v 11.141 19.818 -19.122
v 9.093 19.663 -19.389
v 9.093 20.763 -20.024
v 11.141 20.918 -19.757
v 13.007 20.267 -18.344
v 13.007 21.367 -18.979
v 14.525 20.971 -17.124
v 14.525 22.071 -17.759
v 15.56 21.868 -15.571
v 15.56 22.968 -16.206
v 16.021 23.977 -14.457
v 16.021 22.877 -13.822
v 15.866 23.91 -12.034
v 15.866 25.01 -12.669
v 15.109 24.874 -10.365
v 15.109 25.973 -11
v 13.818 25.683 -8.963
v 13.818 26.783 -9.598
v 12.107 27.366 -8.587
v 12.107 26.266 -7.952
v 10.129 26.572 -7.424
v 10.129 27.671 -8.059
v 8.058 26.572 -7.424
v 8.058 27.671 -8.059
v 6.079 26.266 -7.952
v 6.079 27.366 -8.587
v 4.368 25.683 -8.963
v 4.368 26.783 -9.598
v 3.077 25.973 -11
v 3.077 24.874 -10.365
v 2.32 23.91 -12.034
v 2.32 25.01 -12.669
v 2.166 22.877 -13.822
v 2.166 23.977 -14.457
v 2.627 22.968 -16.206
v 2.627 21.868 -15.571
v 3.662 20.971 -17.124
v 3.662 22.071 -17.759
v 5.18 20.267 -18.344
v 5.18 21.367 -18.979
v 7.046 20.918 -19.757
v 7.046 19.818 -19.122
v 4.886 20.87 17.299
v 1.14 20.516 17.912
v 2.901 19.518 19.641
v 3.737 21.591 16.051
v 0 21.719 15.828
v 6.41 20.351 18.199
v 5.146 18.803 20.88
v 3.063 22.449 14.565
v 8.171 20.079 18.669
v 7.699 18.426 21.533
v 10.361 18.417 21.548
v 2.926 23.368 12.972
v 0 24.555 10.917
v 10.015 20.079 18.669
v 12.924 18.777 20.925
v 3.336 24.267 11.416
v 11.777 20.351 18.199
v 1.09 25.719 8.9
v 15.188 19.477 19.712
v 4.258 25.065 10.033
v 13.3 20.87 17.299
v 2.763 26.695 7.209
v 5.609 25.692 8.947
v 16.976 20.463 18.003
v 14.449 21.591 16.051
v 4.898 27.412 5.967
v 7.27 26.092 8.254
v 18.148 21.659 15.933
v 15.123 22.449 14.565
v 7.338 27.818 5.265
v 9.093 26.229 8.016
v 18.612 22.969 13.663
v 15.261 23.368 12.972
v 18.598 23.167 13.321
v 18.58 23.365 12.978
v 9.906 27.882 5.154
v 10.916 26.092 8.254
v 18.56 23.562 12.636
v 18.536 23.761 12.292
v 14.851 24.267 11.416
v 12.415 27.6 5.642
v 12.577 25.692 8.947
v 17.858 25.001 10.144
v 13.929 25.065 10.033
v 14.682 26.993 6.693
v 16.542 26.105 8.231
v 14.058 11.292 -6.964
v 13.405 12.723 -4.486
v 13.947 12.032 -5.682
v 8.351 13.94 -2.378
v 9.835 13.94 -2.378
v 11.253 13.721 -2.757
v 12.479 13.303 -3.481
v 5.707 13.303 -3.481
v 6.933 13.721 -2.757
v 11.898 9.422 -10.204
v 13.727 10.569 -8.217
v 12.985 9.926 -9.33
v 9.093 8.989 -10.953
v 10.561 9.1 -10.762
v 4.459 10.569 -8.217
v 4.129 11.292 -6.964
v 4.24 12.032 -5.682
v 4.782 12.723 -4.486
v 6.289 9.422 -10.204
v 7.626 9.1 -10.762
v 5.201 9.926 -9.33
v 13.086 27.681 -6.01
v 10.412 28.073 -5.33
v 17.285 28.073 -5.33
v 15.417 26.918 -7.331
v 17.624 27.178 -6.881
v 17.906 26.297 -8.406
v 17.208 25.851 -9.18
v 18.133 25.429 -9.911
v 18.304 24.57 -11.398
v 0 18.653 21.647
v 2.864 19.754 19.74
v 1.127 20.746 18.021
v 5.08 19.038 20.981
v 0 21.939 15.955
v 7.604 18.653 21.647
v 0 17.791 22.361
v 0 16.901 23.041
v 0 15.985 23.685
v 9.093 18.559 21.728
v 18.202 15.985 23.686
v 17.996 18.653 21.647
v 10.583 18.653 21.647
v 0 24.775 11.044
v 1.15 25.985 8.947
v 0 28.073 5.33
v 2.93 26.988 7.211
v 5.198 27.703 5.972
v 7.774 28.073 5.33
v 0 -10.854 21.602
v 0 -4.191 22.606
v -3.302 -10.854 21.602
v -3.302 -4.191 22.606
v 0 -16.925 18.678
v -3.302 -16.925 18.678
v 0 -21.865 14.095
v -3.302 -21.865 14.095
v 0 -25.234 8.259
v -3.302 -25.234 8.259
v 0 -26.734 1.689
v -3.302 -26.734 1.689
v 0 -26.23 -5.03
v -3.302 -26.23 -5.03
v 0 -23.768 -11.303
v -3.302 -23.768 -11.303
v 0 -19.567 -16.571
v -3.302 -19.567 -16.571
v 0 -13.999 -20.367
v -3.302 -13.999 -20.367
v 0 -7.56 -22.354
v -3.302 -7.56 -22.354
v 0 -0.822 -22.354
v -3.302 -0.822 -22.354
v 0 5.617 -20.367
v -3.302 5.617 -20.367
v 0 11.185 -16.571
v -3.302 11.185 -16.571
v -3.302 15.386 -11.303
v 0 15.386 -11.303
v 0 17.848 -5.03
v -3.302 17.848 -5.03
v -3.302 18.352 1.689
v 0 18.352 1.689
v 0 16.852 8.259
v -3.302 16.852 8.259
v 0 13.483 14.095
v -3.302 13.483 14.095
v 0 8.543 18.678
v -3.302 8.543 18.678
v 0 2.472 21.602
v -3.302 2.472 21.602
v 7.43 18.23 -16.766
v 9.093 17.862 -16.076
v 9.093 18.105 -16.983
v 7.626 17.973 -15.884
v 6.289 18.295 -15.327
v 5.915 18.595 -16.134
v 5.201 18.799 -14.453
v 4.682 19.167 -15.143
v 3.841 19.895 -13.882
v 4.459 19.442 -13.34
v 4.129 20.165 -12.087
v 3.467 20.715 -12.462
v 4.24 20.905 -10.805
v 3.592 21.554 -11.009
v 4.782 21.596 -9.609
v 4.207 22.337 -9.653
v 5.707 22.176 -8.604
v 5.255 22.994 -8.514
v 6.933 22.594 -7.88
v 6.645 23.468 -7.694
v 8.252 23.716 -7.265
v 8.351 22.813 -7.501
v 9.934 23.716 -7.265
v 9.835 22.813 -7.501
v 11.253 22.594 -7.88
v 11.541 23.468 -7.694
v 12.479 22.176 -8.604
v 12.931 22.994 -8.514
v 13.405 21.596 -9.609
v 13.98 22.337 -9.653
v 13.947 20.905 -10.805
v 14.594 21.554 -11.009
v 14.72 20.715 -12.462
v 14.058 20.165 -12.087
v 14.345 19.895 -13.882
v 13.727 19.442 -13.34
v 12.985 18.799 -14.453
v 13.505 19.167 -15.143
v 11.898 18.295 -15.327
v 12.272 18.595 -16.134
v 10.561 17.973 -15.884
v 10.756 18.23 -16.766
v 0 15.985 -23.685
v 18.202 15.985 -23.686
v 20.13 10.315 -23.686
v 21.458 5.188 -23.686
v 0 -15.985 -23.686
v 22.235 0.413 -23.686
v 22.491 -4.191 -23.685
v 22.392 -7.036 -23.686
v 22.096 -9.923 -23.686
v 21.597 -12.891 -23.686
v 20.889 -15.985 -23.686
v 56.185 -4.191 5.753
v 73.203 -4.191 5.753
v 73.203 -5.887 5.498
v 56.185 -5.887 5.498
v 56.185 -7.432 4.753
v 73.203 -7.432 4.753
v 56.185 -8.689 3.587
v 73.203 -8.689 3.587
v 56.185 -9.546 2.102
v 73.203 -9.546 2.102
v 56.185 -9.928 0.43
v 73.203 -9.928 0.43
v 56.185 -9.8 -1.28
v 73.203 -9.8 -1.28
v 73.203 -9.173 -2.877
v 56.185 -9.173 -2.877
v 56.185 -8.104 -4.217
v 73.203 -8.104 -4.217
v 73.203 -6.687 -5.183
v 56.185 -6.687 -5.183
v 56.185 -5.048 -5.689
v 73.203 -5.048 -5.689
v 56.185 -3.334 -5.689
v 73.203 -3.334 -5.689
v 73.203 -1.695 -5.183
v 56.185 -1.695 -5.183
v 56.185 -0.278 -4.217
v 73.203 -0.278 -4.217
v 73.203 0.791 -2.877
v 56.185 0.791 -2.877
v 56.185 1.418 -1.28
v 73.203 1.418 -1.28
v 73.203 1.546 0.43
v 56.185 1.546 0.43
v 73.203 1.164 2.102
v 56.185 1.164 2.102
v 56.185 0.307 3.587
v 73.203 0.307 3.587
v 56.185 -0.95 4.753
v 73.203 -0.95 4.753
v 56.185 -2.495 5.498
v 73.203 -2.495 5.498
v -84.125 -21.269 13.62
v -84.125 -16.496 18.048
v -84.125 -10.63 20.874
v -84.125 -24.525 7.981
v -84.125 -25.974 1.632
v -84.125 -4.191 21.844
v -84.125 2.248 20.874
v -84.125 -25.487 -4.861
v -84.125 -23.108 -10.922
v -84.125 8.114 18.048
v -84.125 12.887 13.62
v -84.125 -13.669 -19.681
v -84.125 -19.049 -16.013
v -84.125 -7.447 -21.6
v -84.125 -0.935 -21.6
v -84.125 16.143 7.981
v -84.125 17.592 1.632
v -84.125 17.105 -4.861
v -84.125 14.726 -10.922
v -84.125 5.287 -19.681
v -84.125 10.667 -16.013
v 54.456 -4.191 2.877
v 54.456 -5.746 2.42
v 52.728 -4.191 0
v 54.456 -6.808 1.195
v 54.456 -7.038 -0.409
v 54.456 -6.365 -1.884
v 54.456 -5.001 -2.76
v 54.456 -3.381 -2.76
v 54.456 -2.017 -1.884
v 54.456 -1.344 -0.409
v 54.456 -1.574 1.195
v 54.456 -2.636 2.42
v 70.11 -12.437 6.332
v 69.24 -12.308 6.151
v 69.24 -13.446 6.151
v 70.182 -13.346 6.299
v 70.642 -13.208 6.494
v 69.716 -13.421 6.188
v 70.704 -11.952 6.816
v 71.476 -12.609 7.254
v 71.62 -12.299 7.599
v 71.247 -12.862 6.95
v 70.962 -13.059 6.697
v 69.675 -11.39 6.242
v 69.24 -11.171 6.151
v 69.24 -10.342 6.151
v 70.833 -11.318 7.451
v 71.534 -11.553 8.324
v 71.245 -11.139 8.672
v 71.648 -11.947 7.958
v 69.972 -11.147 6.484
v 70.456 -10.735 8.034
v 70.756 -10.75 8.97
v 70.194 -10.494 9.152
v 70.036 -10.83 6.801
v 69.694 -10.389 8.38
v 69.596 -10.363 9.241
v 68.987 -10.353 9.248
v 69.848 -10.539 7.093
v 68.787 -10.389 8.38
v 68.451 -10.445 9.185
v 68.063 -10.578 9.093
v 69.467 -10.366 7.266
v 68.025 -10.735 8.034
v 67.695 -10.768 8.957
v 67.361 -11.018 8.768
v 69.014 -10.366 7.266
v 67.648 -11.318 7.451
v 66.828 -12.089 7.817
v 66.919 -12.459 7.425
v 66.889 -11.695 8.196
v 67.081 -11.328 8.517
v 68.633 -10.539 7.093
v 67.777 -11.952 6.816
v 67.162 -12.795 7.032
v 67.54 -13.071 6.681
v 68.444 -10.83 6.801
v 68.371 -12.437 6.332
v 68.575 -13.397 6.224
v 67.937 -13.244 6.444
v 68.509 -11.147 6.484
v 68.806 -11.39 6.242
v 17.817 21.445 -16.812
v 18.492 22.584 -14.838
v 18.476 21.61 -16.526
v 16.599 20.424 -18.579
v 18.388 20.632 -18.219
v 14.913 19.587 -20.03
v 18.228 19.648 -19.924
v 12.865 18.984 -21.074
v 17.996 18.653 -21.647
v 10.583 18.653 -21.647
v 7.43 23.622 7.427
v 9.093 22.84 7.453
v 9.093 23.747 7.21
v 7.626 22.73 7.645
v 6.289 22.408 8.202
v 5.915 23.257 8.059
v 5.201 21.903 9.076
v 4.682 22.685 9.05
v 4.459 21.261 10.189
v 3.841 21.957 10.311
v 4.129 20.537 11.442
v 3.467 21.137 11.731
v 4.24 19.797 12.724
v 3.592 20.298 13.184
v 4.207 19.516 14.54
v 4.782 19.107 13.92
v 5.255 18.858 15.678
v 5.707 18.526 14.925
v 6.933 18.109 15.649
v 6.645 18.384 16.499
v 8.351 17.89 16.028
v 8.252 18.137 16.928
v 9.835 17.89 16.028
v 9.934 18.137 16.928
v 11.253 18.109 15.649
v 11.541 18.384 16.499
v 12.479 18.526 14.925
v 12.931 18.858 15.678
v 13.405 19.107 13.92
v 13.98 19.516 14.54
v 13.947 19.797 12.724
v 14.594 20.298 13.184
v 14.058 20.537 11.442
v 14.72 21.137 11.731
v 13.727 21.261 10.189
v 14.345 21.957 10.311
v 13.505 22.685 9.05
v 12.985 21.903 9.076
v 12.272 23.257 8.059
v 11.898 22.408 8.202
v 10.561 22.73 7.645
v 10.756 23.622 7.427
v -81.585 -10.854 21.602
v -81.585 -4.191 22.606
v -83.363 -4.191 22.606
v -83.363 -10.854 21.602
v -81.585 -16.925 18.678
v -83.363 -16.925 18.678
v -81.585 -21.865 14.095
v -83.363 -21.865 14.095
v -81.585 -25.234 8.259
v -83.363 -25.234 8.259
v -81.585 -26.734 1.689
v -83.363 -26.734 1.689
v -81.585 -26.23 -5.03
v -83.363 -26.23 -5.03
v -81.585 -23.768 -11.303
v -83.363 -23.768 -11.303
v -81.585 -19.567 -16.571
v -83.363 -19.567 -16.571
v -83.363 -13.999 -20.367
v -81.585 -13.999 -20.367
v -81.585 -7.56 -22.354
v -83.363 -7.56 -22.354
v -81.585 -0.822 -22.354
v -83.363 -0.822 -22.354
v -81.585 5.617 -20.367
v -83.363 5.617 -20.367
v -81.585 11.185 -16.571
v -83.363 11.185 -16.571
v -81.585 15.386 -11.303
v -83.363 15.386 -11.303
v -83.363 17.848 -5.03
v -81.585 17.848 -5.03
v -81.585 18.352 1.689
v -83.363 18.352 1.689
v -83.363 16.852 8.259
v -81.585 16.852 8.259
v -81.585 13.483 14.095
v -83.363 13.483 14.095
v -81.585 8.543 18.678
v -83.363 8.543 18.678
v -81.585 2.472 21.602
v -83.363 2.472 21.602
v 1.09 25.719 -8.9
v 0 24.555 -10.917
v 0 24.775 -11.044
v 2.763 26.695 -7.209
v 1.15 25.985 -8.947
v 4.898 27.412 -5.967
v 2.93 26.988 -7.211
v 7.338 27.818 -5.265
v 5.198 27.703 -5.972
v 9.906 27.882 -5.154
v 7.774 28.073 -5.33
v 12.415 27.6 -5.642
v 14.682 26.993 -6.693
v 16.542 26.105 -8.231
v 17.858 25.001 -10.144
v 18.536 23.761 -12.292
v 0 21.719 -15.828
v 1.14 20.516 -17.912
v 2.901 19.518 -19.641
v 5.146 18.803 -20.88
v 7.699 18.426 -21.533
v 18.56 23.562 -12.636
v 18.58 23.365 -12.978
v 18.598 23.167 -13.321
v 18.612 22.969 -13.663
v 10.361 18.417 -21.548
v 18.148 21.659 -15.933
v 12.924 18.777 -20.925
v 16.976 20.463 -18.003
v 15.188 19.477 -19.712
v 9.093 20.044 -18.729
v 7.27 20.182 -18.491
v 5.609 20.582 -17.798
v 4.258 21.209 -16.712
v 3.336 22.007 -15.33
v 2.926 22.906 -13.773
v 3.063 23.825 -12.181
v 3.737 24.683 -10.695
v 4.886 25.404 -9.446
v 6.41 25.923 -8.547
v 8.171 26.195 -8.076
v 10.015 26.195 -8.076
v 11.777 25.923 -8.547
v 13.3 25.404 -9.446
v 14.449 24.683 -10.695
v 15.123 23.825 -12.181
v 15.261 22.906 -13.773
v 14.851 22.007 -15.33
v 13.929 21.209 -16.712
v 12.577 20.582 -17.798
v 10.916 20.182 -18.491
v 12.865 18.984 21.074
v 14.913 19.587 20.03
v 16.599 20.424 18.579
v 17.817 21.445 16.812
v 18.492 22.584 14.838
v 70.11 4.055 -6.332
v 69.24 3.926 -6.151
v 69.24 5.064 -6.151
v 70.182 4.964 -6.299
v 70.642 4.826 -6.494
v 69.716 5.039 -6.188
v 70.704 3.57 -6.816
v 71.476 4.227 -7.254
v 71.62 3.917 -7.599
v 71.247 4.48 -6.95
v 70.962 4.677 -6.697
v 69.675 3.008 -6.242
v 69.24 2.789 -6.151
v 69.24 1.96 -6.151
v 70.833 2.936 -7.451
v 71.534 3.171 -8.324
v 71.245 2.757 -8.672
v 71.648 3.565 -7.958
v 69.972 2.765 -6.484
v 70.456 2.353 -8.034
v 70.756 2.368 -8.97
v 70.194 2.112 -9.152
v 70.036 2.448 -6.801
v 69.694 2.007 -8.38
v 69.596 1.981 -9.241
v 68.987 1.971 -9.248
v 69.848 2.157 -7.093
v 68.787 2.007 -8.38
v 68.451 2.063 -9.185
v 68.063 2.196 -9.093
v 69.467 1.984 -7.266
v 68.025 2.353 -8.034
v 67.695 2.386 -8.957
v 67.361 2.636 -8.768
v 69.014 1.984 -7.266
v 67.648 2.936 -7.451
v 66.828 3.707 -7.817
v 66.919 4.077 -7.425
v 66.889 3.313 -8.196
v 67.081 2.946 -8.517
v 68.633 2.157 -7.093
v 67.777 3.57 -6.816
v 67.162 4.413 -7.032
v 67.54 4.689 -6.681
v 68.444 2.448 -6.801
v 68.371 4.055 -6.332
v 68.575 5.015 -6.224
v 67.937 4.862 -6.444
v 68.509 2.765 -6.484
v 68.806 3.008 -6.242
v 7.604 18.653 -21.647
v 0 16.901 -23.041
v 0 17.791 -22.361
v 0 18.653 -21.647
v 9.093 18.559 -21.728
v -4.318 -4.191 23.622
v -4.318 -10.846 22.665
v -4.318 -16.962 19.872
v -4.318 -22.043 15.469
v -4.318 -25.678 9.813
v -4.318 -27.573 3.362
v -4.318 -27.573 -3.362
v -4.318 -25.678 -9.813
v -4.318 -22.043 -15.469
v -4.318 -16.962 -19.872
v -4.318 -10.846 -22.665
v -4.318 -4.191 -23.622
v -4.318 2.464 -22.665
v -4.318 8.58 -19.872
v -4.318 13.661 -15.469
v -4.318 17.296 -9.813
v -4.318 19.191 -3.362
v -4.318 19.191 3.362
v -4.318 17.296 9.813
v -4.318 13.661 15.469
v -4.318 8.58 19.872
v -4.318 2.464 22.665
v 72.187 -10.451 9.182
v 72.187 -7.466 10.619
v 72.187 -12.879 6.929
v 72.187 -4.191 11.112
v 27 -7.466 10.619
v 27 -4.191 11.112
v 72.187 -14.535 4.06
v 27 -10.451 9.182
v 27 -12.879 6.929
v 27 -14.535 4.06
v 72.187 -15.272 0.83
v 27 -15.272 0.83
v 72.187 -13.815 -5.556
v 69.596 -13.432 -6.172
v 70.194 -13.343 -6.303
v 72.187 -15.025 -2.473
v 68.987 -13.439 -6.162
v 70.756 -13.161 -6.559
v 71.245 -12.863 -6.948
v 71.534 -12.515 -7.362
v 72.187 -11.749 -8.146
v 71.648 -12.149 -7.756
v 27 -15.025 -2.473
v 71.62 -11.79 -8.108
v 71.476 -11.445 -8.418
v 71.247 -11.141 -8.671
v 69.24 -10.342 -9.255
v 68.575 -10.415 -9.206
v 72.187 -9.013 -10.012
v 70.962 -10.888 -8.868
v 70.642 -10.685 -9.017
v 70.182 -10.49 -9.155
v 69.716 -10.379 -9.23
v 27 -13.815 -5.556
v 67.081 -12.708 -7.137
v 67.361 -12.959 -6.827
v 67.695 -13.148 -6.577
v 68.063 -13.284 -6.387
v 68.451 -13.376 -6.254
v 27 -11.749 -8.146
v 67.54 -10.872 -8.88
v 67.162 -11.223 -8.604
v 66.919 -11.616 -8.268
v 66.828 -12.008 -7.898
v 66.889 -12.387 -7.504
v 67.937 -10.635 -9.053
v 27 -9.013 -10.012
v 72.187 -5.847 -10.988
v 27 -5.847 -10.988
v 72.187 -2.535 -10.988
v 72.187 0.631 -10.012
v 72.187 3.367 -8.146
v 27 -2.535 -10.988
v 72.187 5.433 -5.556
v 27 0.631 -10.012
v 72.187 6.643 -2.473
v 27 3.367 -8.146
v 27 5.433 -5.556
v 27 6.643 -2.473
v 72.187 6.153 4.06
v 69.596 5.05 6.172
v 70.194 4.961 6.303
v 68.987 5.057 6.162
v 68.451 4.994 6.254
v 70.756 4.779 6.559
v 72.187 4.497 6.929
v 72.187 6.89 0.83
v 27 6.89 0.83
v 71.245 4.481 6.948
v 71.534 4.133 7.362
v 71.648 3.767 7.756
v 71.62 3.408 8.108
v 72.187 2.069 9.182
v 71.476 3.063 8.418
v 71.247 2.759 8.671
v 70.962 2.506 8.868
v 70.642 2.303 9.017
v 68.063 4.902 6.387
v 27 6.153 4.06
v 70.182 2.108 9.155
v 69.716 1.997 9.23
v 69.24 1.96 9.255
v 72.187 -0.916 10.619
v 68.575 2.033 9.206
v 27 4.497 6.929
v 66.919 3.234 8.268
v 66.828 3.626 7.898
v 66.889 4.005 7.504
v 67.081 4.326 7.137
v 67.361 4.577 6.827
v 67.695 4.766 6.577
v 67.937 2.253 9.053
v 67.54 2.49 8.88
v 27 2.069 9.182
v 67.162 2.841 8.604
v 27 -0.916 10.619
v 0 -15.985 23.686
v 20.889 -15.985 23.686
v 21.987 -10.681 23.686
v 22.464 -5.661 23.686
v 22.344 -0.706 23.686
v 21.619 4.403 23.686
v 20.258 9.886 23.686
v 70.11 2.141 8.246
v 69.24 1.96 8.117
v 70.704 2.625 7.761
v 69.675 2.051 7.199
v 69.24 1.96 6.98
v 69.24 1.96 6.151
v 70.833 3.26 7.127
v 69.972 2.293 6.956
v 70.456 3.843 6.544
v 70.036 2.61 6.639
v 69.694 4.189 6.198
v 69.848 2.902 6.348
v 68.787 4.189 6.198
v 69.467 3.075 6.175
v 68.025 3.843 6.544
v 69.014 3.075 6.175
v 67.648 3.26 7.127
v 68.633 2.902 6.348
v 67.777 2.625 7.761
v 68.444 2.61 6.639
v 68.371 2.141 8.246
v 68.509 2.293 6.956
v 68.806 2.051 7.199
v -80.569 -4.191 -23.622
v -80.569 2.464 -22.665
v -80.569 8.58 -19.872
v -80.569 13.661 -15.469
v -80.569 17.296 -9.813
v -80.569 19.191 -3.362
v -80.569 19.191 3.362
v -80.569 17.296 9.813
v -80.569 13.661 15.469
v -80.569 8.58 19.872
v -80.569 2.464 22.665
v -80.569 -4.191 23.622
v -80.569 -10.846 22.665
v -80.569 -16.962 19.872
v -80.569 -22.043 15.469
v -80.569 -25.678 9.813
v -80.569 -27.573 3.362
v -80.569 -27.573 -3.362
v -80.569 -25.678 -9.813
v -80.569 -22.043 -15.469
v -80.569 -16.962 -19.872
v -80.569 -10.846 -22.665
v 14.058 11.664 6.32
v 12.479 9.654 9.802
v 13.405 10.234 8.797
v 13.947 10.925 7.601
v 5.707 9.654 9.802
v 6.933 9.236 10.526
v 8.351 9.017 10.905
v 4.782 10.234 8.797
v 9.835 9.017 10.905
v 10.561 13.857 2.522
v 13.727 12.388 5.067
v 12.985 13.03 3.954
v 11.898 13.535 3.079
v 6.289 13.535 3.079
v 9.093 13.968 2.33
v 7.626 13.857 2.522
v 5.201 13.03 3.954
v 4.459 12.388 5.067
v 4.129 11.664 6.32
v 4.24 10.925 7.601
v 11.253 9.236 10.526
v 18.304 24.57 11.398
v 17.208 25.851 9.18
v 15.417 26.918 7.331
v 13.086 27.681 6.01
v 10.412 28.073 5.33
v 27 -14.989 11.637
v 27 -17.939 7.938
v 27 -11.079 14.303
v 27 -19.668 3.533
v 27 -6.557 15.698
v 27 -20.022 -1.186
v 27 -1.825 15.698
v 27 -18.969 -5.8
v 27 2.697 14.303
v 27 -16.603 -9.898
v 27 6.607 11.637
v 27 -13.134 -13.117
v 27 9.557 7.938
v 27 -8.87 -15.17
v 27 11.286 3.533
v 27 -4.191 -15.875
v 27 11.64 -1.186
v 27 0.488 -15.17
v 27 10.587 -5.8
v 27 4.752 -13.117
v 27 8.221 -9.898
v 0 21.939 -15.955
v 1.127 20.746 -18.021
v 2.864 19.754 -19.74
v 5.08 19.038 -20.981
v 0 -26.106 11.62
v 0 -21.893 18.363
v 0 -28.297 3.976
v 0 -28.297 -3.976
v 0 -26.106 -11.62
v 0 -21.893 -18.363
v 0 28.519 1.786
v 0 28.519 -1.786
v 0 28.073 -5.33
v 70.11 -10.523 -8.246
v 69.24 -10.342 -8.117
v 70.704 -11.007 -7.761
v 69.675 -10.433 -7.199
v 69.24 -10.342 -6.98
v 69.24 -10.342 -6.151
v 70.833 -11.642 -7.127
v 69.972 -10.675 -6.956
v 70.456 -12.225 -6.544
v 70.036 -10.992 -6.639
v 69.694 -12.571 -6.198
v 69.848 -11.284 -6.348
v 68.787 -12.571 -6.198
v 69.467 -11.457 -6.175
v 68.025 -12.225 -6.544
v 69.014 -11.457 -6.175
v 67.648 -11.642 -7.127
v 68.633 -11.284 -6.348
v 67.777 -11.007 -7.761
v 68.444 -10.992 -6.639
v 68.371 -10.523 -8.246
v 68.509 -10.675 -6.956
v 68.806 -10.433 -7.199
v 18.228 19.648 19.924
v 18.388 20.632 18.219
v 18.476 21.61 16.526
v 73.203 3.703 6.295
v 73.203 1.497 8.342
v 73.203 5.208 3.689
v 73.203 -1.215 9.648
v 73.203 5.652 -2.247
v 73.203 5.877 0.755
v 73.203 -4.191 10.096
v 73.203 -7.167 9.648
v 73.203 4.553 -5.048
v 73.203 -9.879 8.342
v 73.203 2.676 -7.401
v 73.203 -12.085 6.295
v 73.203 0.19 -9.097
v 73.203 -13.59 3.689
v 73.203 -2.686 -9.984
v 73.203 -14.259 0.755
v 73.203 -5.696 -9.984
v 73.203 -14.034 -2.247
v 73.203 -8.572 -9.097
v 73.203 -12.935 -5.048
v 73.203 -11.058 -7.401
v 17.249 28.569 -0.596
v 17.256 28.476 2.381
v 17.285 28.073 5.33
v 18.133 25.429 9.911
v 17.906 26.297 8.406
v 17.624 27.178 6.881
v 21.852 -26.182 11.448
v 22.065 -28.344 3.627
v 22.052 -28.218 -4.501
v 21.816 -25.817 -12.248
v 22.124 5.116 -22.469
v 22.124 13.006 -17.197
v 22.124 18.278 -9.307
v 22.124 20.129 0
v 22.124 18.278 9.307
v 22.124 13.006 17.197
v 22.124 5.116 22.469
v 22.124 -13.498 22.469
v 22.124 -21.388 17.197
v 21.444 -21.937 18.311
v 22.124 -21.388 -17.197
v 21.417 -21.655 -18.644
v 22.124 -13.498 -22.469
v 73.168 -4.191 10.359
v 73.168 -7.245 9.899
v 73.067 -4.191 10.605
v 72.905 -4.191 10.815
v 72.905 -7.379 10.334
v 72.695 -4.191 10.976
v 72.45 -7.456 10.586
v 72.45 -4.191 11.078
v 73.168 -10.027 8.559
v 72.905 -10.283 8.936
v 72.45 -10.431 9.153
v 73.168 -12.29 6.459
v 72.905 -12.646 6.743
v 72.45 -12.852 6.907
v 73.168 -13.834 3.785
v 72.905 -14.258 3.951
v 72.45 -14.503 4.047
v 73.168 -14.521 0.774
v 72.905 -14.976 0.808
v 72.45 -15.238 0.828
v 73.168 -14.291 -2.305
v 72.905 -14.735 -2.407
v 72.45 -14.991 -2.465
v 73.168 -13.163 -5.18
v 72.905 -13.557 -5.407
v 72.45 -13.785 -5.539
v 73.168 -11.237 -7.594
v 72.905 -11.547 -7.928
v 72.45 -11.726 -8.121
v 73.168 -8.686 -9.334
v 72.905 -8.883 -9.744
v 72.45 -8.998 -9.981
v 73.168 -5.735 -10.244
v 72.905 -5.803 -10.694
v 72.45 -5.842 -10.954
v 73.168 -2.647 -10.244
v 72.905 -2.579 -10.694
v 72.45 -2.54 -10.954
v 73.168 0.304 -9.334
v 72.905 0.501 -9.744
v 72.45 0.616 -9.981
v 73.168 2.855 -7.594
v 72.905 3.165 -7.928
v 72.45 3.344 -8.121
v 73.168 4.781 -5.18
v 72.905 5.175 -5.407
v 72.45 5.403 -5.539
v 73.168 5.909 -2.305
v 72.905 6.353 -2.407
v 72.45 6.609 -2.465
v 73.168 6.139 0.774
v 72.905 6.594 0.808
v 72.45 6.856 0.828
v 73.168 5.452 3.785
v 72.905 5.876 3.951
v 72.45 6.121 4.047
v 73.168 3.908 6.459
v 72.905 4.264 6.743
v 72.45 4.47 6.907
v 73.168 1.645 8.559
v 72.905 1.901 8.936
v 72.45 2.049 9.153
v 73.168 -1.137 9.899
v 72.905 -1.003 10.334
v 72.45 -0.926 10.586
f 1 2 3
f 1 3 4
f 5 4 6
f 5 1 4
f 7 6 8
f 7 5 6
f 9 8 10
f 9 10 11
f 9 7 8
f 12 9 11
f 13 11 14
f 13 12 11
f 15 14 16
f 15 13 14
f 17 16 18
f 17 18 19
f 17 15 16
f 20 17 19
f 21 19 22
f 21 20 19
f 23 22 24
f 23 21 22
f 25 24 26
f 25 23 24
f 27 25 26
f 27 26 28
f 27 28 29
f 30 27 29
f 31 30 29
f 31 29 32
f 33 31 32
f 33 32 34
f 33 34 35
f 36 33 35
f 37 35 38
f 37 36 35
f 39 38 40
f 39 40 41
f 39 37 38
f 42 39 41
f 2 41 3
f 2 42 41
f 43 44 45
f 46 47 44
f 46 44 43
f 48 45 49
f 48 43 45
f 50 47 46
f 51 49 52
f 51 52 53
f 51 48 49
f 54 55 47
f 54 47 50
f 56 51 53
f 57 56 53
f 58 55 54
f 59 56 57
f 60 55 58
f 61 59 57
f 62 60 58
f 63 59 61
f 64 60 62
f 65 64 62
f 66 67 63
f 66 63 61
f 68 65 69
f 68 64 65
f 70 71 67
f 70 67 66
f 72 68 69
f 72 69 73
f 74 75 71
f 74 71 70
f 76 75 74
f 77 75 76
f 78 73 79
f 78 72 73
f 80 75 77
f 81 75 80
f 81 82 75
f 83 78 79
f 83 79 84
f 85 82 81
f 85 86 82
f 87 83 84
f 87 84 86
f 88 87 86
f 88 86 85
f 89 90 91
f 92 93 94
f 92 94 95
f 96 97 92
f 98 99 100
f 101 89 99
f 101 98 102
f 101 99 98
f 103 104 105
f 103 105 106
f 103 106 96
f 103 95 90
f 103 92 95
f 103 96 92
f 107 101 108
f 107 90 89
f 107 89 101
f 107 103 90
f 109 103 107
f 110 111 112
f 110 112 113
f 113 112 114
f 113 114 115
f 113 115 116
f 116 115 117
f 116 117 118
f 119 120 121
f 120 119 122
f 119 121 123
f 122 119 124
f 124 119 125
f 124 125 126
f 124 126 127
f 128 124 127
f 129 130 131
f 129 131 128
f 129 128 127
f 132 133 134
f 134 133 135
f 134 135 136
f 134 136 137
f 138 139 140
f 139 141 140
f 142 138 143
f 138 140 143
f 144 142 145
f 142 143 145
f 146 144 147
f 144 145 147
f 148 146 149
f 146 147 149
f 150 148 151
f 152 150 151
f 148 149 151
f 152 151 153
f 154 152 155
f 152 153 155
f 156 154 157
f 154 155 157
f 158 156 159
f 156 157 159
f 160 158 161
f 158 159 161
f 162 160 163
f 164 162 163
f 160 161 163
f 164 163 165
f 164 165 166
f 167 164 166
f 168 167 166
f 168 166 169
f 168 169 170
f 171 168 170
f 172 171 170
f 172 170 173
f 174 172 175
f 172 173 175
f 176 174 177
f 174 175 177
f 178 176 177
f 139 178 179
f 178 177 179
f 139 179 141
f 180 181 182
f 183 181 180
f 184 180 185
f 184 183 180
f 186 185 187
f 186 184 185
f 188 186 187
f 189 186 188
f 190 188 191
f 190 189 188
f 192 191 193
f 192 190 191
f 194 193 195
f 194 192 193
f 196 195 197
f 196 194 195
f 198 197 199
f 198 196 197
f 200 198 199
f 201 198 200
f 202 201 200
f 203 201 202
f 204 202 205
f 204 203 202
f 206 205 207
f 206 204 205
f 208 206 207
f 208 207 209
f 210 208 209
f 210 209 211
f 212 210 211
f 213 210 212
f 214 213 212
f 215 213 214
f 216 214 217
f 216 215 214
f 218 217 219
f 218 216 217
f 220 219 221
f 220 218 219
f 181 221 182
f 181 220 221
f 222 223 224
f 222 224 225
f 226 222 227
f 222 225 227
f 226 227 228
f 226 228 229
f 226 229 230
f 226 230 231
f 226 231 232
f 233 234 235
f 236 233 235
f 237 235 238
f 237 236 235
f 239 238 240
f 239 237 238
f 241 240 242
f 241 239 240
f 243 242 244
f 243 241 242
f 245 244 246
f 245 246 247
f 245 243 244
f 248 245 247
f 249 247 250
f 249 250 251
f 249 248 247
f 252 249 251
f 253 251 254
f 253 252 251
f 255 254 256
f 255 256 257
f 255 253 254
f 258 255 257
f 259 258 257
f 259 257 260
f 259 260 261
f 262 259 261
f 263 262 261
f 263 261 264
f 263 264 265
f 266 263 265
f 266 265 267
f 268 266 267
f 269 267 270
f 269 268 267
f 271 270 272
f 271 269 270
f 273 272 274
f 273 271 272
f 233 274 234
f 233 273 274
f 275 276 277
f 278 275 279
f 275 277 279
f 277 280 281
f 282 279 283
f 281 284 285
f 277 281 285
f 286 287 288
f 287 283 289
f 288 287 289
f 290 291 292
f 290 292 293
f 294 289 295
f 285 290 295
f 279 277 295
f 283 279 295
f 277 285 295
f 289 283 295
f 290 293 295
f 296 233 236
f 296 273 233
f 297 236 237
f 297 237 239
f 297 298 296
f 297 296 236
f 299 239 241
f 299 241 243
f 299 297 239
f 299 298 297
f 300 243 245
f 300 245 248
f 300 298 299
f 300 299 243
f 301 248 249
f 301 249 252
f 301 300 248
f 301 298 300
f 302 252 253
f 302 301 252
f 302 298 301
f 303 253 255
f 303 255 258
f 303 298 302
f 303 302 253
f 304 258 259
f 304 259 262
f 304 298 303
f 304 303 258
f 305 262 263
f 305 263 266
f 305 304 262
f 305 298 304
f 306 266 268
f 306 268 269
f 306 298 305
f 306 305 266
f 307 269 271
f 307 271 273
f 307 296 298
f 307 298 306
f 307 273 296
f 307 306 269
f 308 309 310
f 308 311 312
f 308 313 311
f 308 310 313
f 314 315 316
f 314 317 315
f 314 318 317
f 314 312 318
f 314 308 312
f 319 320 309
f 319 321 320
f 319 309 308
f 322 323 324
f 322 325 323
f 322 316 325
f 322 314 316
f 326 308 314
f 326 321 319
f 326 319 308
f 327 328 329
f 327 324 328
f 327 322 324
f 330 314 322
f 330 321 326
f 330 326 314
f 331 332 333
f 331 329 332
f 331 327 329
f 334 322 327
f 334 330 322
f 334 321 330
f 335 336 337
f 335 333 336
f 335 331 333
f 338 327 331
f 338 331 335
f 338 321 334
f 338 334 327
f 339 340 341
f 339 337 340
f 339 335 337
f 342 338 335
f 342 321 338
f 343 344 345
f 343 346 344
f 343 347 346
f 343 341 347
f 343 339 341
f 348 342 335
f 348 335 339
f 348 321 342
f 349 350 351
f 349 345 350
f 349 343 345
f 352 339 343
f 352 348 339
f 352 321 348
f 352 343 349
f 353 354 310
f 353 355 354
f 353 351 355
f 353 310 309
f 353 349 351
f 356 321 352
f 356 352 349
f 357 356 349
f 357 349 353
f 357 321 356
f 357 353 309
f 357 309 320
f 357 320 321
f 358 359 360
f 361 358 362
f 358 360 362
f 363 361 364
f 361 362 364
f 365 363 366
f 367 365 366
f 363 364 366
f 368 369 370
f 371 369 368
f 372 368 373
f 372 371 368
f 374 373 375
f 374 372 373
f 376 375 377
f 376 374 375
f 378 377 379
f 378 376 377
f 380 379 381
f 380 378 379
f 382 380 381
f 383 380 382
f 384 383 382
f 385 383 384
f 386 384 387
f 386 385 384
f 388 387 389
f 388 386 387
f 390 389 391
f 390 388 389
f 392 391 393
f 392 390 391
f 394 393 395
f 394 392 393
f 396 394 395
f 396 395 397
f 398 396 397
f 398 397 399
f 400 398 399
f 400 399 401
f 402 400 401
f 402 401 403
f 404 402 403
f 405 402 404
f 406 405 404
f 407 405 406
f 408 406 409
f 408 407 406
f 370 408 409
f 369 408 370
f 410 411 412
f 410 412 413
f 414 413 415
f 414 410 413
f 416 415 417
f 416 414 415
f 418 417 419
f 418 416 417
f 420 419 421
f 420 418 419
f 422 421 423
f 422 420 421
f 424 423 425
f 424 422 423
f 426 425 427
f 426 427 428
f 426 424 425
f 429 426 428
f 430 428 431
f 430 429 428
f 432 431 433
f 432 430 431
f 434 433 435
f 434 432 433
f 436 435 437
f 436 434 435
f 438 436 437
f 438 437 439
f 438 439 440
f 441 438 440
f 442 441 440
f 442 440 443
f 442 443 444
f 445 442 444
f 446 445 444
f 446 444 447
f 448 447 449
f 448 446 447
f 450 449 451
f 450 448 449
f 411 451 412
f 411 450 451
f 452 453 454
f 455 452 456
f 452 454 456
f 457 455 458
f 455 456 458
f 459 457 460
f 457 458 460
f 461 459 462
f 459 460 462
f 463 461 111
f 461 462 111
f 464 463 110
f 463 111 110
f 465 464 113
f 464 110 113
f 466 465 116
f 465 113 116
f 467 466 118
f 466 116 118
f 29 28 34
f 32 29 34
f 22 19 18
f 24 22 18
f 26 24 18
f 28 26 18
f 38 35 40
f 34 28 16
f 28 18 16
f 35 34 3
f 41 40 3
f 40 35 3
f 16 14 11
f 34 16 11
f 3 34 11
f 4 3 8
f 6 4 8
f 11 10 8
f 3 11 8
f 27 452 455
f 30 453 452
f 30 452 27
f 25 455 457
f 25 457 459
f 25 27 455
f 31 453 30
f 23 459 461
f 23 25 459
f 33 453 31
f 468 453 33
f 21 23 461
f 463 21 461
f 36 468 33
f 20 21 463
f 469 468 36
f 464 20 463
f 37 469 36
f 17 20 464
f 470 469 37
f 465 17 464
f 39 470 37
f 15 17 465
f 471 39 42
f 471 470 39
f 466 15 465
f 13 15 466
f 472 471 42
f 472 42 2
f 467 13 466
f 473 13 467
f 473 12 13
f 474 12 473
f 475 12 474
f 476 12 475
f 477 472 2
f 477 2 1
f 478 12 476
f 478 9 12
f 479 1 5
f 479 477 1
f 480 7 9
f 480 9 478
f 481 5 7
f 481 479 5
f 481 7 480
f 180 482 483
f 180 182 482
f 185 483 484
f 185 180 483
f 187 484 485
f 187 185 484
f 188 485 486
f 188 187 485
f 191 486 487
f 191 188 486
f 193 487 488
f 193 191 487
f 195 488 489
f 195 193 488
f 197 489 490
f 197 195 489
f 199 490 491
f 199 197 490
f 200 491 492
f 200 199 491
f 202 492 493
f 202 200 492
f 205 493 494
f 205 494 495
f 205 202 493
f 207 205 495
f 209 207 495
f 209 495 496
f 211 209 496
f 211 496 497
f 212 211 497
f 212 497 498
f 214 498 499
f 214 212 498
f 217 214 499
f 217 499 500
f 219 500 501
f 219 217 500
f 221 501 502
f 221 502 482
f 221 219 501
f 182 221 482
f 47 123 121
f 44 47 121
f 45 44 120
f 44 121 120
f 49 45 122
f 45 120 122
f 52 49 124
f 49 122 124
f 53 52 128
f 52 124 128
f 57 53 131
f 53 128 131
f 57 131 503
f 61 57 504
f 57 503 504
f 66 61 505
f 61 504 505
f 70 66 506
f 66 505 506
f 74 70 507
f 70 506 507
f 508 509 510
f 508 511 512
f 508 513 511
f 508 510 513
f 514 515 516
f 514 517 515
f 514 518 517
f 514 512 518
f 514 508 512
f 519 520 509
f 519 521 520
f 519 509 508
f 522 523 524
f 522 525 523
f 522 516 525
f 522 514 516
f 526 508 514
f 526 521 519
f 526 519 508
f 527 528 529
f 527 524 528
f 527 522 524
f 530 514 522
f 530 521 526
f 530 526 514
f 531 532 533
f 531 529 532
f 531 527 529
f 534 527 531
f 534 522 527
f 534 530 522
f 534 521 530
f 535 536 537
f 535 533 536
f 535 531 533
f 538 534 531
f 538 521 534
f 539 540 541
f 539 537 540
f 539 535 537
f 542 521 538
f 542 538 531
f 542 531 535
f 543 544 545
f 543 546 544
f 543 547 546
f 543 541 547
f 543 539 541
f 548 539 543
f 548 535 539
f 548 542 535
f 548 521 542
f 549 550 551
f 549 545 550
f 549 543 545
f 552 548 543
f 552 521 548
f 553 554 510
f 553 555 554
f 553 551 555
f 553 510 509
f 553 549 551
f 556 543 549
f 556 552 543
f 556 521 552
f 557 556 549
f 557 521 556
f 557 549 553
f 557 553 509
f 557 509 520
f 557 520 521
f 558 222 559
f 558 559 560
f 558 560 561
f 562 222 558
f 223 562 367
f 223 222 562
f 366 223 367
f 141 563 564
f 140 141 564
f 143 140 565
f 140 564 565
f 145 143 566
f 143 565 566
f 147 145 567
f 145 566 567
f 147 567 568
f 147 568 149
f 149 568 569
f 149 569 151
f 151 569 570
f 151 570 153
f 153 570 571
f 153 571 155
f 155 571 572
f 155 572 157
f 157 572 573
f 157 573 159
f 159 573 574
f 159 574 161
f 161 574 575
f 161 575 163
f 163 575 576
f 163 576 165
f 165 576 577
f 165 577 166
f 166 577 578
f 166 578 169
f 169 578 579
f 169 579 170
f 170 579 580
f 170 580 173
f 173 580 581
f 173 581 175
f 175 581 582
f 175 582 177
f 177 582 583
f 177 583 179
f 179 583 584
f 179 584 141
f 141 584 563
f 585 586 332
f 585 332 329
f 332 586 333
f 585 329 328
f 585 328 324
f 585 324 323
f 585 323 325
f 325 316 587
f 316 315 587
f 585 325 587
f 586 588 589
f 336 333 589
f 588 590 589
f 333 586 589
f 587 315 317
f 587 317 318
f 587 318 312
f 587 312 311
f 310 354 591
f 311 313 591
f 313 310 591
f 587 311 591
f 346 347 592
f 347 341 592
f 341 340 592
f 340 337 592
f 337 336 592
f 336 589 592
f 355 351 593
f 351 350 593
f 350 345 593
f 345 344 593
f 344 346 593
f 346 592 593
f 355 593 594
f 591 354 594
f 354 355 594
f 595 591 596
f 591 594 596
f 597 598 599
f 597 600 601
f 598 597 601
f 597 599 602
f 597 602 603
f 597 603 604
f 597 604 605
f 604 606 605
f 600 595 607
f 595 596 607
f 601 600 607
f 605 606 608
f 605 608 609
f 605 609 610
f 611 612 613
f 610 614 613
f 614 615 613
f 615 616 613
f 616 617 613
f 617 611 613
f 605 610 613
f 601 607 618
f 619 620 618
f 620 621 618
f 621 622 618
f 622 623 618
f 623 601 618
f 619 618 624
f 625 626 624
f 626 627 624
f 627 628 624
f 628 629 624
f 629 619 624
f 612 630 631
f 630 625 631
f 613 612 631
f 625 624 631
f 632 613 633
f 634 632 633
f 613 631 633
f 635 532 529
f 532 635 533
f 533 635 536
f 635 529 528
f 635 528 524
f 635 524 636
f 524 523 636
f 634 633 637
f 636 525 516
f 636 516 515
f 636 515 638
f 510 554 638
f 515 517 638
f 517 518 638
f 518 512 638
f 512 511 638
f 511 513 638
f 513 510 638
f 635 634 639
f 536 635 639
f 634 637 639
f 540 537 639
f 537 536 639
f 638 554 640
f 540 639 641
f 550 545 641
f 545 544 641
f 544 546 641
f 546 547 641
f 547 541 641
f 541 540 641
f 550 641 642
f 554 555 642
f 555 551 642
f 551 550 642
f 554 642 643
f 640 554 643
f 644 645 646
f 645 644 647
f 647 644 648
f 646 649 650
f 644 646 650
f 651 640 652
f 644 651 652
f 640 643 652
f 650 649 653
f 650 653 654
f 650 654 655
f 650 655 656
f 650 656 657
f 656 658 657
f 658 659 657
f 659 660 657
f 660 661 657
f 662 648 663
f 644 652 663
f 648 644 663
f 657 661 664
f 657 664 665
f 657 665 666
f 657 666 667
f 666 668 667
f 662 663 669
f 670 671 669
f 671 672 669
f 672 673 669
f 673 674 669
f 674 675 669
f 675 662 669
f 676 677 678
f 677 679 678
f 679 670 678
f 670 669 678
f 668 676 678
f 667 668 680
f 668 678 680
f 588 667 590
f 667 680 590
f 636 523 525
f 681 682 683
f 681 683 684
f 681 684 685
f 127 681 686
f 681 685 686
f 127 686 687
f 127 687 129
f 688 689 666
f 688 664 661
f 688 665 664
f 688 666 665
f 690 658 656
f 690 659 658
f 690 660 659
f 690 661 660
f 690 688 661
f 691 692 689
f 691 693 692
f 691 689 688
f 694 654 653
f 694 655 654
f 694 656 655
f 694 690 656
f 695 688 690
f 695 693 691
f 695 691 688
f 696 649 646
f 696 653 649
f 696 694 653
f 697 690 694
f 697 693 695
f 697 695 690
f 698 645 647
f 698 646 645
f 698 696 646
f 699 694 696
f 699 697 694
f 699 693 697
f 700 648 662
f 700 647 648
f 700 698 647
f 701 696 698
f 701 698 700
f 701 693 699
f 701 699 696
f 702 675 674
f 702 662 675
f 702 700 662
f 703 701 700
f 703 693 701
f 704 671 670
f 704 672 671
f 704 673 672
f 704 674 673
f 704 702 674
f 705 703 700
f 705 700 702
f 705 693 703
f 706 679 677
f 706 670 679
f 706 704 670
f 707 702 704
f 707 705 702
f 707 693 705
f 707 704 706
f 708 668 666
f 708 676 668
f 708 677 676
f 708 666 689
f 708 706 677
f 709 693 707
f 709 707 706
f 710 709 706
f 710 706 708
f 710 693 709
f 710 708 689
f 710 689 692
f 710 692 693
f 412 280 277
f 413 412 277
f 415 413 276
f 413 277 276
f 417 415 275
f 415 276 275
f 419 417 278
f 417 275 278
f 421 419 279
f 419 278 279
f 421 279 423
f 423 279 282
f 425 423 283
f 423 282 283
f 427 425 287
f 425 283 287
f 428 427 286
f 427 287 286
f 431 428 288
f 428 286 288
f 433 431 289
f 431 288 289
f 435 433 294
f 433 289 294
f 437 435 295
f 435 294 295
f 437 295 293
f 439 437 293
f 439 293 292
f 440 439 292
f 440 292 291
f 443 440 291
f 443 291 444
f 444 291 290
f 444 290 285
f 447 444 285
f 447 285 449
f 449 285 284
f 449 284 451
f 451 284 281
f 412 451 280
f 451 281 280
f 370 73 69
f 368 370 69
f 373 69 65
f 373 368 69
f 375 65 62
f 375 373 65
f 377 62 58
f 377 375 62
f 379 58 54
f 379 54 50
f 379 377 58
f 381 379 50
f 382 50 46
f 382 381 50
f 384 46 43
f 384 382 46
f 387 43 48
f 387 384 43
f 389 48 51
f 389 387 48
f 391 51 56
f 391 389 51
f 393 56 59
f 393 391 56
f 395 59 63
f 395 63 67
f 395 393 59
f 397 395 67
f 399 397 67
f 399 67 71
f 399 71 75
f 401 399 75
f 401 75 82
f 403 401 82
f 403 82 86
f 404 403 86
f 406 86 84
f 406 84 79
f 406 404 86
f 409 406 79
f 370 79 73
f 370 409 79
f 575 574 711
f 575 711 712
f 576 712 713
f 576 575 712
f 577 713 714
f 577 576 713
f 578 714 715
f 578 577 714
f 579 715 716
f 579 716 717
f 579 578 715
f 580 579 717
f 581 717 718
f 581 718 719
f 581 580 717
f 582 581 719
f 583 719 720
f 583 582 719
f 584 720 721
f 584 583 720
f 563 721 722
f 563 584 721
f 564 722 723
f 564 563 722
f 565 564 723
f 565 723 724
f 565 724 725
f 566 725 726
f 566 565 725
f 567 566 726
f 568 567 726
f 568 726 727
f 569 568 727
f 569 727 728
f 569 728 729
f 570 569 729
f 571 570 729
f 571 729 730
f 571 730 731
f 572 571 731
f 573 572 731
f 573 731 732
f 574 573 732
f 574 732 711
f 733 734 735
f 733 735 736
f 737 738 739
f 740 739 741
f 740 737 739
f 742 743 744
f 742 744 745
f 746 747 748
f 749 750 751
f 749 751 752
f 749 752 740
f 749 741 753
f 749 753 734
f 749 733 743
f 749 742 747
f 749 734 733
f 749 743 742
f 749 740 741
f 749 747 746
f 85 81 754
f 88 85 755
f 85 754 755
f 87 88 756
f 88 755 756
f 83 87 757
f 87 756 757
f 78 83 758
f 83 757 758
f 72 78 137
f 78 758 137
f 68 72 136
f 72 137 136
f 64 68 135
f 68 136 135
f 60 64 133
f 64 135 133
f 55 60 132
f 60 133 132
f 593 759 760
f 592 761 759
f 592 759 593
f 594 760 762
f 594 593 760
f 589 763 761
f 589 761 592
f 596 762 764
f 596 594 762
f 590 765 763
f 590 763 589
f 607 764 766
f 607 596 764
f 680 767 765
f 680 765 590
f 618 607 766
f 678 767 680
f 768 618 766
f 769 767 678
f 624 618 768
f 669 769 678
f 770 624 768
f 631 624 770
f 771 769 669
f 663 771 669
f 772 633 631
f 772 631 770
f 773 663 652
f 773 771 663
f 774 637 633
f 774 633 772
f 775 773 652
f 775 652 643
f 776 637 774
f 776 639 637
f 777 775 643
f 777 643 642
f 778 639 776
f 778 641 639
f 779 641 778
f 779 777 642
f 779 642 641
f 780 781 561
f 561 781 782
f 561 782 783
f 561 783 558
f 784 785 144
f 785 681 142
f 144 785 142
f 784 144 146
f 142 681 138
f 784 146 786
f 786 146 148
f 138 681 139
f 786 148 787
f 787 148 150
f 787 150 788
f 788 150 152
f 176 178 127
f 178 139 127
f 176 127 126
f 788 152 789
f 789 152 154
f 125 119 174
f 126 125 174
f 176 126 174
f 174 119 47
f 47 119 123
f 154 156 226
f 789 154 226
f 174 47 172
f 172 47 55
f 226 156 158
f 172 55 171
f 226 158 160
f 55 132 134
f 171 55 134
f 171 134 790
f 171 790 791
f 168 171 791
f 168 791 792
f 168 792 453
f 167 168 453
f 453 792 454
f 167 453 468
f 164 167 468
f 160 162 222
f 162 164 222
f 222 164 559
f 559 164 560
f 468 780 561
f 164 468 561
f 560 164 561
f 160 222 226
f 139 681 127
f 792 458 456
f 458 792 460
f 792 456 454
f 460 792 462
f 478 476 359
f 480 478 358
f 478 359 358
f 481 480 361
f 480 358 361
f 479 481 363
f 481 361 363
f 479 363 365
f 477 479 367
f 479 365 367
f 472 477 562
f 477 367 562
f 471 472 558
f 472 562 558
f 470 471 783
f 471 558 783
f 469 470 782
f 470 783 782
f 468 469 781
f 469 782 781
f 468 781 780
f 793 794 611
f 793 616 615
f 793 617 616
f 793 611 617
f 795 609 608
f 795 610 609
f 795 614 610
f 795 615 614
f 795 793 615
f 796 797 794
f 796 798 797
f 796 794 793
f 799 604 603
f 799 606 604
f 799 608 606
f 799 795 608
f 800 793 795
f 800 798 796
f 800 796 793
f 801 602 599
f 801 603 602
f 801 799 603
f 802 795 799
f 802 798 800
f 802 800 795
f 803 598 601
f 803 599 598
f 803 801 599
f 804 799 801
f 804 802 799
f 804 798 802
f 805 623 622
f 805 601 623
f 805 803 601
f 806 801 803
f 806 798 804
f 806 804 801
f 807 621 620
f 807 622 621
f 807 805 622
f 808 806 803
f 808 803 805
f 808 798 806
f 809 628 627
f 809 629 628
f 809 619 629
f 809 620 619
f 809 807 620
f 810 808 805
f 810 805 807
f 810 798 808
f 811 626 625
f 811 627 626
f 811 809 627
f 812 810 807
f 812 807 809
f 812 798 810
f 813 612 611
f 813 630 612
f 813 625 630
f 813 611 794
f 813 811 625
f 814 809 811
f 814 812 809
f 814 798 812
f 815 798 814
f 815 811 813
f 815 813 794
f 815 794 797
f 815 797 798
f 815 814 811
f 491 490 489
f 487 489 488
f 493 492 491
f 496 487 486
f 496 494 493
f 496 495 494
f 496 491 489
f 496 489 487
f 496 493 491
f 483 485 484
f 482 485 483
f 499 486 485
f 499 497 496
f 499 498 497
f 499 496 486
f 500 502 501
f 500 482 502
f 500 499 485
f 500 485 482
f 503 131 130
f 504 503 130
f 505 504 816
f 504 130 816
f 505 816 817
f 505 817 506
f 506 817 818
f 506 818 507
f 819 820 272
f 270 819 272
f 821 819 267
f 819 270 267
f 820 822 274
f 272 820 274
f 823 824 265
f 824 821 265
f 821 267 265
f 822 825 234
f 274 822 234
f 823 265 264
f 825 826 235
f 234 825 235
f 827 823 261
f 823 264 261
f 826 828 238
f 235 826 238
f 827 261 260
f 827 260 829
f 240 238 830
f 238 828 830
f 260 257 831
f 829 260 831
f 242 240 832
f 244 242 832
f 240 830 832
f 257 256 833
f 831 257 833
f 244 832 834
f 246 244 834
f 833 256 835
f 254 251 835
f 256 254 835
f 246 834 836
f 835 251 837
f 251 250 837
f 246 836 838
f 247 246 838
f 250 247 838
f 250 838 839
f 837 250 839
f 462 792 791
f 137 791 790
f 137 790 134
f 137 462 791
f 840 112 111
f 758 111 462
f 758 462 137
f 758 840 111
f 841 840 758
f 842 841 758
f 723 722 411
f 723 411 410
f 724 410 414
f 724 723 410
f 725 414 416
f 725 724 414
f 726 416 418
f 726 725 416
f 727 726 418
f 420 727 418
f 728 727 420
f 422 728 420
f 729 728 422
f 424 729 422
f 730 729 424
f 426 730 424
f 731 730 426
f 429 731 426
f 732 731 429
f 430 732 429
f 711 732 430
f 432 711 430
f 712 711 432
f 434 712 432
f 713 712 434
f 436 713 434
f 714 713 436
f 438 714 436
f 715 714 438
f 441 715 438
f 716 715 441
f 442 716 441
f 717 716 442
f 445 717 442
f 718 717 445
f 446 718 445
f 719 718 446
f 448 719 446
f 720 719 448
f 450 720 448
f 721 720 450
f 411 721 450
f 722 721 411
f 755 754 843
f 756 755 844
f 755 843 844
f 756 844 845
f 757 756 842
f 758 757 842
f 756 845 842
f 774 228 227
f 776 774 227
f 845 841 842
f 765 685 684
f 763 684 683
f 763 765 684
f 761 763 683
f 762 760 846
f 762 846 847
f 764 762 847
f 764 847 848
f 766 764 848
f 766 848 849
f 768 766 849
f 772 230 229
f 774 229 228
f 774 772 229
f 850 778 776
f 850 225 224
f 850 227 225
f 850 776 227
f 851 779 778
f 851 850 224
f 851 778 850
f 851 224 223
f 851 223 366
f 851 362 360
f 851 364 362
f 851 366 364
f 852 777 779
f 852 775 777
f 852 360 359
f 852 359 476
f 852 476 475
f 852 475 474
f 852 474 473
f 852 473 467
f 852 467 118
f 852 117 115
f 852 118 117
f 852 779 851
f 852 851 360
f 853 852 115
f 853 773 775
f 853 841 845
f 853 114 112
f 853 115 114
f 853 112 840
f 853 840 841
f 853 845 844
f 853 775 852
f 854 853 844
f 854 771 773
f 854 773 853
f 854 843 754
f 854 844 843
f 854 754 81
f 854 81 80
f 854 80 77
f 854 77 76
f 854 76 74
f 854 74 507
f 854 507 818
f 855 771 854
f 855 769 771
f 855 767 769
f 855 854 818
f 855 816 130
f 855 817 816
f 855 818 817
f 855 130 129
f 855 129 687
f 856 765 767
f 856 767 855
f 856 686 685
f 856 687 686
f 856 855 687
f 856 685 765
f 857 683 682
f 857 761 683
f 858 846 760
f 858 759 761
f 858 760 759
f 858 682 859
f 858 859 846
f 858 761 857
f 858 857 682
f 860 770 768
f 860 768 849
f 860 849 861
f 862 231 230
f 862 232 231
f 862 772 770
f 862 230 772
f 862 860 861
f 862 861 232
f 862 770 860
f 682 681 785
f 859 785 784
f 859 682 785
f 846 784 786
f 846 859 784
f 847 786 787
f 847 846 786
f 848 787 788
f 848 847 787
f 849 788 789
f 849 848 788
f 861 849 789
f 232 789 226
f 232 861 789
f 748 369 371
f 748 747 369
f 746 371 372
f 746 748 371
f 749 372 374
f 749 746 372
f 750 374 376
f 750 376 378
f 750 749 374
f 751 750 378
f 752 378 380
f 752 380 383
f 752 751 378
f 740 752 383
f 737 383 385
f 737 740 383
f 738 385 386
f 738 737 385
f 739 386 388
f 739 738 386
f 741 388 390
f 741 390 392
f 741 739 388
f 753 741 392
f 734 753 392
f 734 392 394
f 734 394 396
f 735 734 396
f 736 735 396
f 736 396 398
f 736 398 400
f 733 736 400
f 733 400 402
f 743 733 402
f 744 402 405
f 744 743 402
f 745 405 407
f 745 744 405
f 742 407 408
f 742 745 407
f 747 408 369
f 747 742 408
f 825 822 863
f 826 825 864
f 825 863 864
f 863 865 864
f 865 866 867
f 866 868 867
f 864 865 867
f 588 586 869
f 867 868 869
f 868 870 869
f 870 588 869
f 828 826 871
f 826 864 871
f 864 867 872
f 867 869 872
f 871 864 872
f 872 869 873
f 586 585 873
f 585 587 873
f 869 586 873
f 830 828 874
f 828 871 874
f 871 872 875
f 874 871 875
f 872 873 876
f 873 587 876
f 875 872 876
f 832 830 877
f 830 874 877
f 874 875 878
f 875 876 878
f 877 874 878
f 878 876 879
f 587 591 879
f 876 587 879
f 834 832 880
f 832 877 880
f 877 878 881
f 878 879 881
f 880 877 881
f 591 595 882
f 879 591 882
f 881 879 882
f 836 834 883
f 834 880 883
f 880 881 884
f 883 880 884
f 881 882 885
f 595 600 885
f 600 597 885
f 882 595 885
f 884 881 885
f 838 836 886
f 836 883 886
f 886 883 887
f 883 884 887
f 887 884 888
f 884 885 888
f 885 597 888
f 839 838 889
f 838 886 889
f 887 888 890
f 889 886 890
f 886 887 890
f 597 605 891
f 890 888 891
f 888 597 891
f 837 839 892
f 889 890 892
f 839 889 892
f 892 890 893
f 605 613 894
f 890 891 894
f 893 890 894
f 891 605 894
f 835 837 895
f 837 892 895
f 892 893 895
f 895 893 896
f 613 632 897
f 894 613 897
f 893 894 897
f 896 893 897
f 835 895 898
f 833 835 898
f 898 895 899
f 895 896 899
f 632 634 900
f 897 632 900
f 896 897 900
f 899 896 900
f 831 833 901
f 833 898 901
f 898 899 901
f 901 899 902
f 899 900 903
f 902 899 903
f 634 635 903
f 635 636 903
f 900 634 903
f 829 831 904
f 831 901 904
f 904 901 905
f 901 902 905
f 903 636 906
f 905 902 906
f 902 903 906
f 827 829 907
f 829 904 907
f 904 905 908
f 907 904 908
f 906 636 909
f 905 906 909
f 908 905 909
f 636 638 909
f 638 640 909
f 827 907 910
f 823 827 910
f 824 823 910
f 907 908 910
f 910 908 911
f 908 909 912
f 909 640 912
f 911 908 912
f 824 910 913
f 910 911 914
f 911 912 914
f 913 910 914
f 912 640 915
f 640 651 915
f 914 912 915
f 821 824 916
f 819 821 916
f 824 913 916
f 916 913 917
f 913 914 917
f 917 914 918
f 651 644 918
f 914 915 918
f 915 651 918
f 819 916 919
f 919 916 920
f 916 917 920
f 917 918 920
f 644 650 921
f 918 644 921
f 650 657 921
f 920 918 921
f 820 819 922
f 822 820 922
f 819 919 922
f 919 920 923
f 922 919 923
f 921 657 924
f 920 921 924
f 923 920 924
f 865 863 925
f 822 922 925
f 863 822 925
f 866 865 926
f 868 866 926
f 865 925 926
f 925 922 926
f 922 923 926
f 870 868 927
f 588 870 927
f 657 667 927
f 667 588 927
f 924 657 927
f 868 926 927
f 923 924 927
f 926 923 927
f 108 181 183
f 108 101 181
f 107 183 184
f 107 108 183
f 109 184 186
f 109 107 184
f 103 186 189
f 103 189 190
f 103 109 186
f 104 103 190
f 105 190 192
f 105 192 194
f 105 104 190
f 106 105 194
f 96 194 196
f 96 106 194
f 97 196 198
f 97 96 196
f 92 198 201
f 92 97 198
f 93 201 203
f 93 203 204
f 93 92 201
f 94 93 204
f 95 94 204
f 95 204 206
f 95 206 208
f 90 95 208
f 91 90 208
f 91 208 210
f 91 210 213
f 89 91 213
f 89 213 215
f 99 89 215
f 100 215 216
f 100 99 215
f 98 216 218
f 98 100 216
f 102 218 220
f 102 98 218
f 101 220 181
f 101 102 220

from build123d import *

# Parameters (mm, degrees)
SKETCH1_R           = 28.575
EXTRUDE1_DEPTH      = 27.0002
EXTRUDE1_DEPTH_BACK = 84.1248
CUT_EXTRUDE1_REACH  = 86.125
SKETCH2_R           = 28.575
SKETCH2_R_2         = 23.622
CUT_EXTRUDE3_START  = -27.0002
CUT_EXTRUDE3_DEPTH  = 27.0002
SKETCH18_R          = 9.525
CUT_EXTRUDE4_DEPTH  = 0.254
SKETCH19_R          = 9.525
CUT_EXTRUDE5_DEPTH  = 0.254
CHAMFER1_SIZE       = 0.762
SKETCH15_R          = 6.9469
EXTRUDE2_DEPTH      = 1.27
CIRPATTERN1_COUNT   = 4


with BuildPart() as part:
    # Sketch1 → Extrude1 (new body, two sides)
    with BuildSketch(Plane(origin=(0, 0, 0), x_dir=(0, 0, -1), z_dir=(1, 0, 0))) as extrude1_sk:
        Circle(SKETCH1_R)
    extrude(amount=EXTRUDE1_DEPTH)
    extrude(extrude1_sk.sketch, amount=-EXTRUDE1_DEPTH_BACK)

    # Sketch2 → Cut-Extrude1 (cut, up to next)
    with BuildSketch(Plane(origin=(0, 0, 0), x_dir=(0, 0, -1), z_dir=(1, 0, 0)), mode=Mode.PRIVATE) as cut_extrude1_sk1:
        Circle(SKETCH2_R)
        with Locations((0, -4.191)):
            Circle(SKETCH2_R_2, mode=Mode.SUBTRACT)
    cut_extrude1_tool1 = extrude(cut_extrude1_sk1.sketch, amount=-CUT_EXTRUDE1_REACH, mode=Mode.PRIVATE) & part.part
    add(cut_extrude1_tool1.solids().sort_by_distance((0, 0, 27.766777))[0], mode=Mode.SUBTRACT)

    # Sketch4 → Cut-Extrude3 (cut)
    with BuildSketch(Plane.ZY.offset(CUT_EXTRUDE3_START)):
        with BuildLine():
            Line((23.6855, -25.666178421), (23.6855, 17.476089577))
            Line((23.6855, 17.476089577), (0, 31.150919378))
            Line((0, 31.150919378), (-23.6855, 17.476089577))
            Line((-23.6855, 17.476089577), (-23.6855, -25.666178421))
            ThreePointArc((-23.6855, -25.666178421), (0, 34.925), (23.6855, -25.666178421))
        make_face()
    extrude(amount=CUT_EXTRUDE3_DEPTH, mode=Mode.SUBTRACT)

    # Sketch6 → Cut-Revolve2 (revolve, cut)
    with BuildSketch(Plane.XY, mode=Mode.PRIVATE) as cut_revolve2_sk:
        Polygon((0.750392661, 57.15), (27.0002, 11.684), (27.0002, 57.15), align=None)
    revolve(cut_revolve2_sk.sketch.rotate(Axis((-0.562097706, -4.191, 0), (1, 0, 0)), 270), axis=Axis((-0.562097706, -4.191, 0), (1, 0, 0)), mode=Mode.SUBTRACT)  # turned: the seam where the file's is

    # S2D0002 → Cut-Revolve3 (revolve, cut)
    with BuildSketch(Plane(origin=(9.0932, 23.136869081, 13.372742289), x_dir=(0, 0.5, -0.866025404), z_dir=(1, 0, 0))):
        Polygon((0, 0), (6.1849, 0), (5.642306865, -2.5527), (4.9784, -3.216606865), (4.9784, -13.462), (0, -13.462), align=None)
    revolve(axis=Axis((9.0932, 10.895513396, 6.305192289), (0, 0.866025404, 0.5)), mode=Mode.SUBTRACT)

    # Sketch8 → Cut-Revolve4 (revolve, cut)
    with BuildSketch(Plane(origin=(9.0932, 23.136869081, -13.372742289), x_dir=(0, -0.5, -0.866025404), z_dir=(1, 0, 0))):
        Polygon((0, 0), (6.1849, 0), (5.642306865, -2.5527), (4.9784, -3.216606865), (4.9784, -13.462), (0, -13.462), align=None)
    revolve(axis=Axis((9.0932, 10.895513396, -6.305192289), (0, 0.866025404, -0.5)), mode=Mode.SUBTRACT)

    # Sketch18 → Cut-Extrude4 (cut)
    with BuildSketch(Plane(origin=(0, 23.363189534, 13.488743766), x_dir=(1, 0, 0), z_dir=(0, 0.866025404, 0.5))):
        with Locations((9.0932, -0.0127)):
            Circle(SKETCH18_R)
    extrude(amount=-CUT_EXTRUDE4_DEPTH, mode=Mode.SUBTRACT)

    # Sketch19 → Cut-Extrude5 (cut)
    with BuildSketch(Plane(origin=(0, 23.363189534, -13.488743766), x_dir=(1, 0, 0), z_dir=(0, 0.866025404, -0.5))):
        with Locations((9.0932, 0.0127)):
            Circle(SKETCH19_R)
    extrude(amount=-CUT_EXTRUDE5_DEPTH, mode=Mode.SUBTRACT)

    # Sketch10 → Cut-Revolve6 (revolve, cut)
    with BuildSketch(Plane.XY, mode=Mode.PRIVATE) as cut_revolve6_sk:
        Polygon((0, 19.431), (0, 18.415), (-3.302, 18.415), (-4.318, 19.431), align=None)
    revolve(cut_revolve6_sk.sketch.rotate(Axis((-4.5339, -4.191, 0), (1, 0, 0)), 90), axis=Axis((-4.5339, -4.191, 0), (1, 0, 0)), mode=Mode.SUBTRACT)  # turned: the seam where the file's is

    # Sketch12 → Cut-Revolve8 (revolve, cut)
    with BuildSketch(Plane.XY, mode=Mode.PRIVATE) as cut_revolve8_sk:
        Polygon((-84.1248, 19.431), (-84.1248, 18.415), (-81.5848, 18.415), (-80.5688, 19.431), align=None)
    revolve(cut_revolve8_sk.sketch.rotate(Axis((-84.3026, -4.191, 0), (1, 0, 0)), 90), axis=Axis((-84.3026, -4.191, 0), (1, 0, 0)), mode=Mode.SUBTRACT)  # turned: the seam where the file's is

    # Chamfer1
    chamfer1_edges = [part.edges().sort_by_distance(p)[0] for p in [
        (-84.1248, -4.191, -22.606),
    ]]
    chamfer(chamfer1_edges, length=CHAMFER1_SIZE)

    # Sketch13 → Revolve1 (revolve)
    with BuildSketch(Plane(origin=(0, 0, 0), x_dir=(0, -1, 0), z_dir=(0, 0, 1)), mode=Mode.PRIVATE) as revolve1_sk:
        with BuildLine():
            Line((4.191, 27.0002), (4.191, 73.2028))
            Line((4.191, 73.2028), (14.2875, 73.2028))
            ThreePointArc((14.2875, 73.2028), (15.00592049, 72.90522049), (15.3035, 72.1868))
            Line((15.3035, 72.1868), (15.3035, 27.0002))
            Line((15.3035, 27.0002), (4.191, 27.0002))
        make_face()
    revolve(revolve1_sk.sketch.rotate(Axis((25.10663, -4.191, 0), (1, 0, 0)), 270), axis=Axis((25.10663, -4.191, 0), (1, 0, 0)))  # turned: the seam where the file's is

    # S2D0001 → Cut-Revolve9 (revolve, cut)
    with BuildSketch(Plane(origin=(64.8716, -9.9441, 0), x_dir=(0, -1, 0), z_dir=(0, 0, 1)), mode=Mode.PRIVATE) as cut_revolve9_sk:
        Polygon((0, 8.3312), (0, -8.6868), (-5.7531, -12.143611227), (-5.7531, 8.3312), align=None)
    revolve(cut_revolve9_sk.sketch.rotate(Axis((43.373048211, -4.191, 0), (1, 0, 0)), 270), axis=Axis((43.373048211, -4.191, 0), (1, 0, 0)), mode=Mode.SUBTRACT)  # turned: the seam where the file's is

    # Sketch15 → Extrude2 (add)
    with BuildSketch(Plane(origin=(27.0002, 23.143219081, -13.361743766), x_dir=(0, -0.5, -0.866025404), z_dir=(0, -0.866025404, 0.5))):
        with Locations((0.0127, -17.907)):
            Circle(SKETCH15_R)
    extrude(amount=-EXTRUDE2_DEPTH)

    # Sketch16 → Cut-Revolve10 (revolve, cut)
    with BuildSketch(Plane(origin=(60.9092, 3.666724106, -7.857724106), x_dir=(-1, 0, 0), z_dir=(0, -0.707106781, -0.707106781)), mode=Mode.PRIVATE) as cut_revolve10_sk:
        Polygon((-8.3312, 0), (-5.9182, 0), (-8.3312, -2.413), align=None)
    cut_revolve10 = revolve(cut_revolve10_sk.sketch.rotate(Axis((69.2404, 0.494324135, -4.685324135), (0, 0.707106781, -0.707106781)), 90), axis=Axis((69.2404, 0.494324135, -4.685324135), (0, 0.707106781, -0.707106781)), mode=Mode.SUBTRACT)  # turned: the seam where the file's is

    # CirPattern1: Cut-Revolve10 ×4 about axis
    cirpattern1_axis = Axis((25.10663, -4.191, 0), (-1, 0, 0))
    for i in range(1, CIRPATTERN1_COUNT):
        add(cut_revolve10.rotate(cirpattern1_axis, i * 360 / CIRPATTERN1_COUNT), mode=Mode.SUBTRACT)


solid = part.part
